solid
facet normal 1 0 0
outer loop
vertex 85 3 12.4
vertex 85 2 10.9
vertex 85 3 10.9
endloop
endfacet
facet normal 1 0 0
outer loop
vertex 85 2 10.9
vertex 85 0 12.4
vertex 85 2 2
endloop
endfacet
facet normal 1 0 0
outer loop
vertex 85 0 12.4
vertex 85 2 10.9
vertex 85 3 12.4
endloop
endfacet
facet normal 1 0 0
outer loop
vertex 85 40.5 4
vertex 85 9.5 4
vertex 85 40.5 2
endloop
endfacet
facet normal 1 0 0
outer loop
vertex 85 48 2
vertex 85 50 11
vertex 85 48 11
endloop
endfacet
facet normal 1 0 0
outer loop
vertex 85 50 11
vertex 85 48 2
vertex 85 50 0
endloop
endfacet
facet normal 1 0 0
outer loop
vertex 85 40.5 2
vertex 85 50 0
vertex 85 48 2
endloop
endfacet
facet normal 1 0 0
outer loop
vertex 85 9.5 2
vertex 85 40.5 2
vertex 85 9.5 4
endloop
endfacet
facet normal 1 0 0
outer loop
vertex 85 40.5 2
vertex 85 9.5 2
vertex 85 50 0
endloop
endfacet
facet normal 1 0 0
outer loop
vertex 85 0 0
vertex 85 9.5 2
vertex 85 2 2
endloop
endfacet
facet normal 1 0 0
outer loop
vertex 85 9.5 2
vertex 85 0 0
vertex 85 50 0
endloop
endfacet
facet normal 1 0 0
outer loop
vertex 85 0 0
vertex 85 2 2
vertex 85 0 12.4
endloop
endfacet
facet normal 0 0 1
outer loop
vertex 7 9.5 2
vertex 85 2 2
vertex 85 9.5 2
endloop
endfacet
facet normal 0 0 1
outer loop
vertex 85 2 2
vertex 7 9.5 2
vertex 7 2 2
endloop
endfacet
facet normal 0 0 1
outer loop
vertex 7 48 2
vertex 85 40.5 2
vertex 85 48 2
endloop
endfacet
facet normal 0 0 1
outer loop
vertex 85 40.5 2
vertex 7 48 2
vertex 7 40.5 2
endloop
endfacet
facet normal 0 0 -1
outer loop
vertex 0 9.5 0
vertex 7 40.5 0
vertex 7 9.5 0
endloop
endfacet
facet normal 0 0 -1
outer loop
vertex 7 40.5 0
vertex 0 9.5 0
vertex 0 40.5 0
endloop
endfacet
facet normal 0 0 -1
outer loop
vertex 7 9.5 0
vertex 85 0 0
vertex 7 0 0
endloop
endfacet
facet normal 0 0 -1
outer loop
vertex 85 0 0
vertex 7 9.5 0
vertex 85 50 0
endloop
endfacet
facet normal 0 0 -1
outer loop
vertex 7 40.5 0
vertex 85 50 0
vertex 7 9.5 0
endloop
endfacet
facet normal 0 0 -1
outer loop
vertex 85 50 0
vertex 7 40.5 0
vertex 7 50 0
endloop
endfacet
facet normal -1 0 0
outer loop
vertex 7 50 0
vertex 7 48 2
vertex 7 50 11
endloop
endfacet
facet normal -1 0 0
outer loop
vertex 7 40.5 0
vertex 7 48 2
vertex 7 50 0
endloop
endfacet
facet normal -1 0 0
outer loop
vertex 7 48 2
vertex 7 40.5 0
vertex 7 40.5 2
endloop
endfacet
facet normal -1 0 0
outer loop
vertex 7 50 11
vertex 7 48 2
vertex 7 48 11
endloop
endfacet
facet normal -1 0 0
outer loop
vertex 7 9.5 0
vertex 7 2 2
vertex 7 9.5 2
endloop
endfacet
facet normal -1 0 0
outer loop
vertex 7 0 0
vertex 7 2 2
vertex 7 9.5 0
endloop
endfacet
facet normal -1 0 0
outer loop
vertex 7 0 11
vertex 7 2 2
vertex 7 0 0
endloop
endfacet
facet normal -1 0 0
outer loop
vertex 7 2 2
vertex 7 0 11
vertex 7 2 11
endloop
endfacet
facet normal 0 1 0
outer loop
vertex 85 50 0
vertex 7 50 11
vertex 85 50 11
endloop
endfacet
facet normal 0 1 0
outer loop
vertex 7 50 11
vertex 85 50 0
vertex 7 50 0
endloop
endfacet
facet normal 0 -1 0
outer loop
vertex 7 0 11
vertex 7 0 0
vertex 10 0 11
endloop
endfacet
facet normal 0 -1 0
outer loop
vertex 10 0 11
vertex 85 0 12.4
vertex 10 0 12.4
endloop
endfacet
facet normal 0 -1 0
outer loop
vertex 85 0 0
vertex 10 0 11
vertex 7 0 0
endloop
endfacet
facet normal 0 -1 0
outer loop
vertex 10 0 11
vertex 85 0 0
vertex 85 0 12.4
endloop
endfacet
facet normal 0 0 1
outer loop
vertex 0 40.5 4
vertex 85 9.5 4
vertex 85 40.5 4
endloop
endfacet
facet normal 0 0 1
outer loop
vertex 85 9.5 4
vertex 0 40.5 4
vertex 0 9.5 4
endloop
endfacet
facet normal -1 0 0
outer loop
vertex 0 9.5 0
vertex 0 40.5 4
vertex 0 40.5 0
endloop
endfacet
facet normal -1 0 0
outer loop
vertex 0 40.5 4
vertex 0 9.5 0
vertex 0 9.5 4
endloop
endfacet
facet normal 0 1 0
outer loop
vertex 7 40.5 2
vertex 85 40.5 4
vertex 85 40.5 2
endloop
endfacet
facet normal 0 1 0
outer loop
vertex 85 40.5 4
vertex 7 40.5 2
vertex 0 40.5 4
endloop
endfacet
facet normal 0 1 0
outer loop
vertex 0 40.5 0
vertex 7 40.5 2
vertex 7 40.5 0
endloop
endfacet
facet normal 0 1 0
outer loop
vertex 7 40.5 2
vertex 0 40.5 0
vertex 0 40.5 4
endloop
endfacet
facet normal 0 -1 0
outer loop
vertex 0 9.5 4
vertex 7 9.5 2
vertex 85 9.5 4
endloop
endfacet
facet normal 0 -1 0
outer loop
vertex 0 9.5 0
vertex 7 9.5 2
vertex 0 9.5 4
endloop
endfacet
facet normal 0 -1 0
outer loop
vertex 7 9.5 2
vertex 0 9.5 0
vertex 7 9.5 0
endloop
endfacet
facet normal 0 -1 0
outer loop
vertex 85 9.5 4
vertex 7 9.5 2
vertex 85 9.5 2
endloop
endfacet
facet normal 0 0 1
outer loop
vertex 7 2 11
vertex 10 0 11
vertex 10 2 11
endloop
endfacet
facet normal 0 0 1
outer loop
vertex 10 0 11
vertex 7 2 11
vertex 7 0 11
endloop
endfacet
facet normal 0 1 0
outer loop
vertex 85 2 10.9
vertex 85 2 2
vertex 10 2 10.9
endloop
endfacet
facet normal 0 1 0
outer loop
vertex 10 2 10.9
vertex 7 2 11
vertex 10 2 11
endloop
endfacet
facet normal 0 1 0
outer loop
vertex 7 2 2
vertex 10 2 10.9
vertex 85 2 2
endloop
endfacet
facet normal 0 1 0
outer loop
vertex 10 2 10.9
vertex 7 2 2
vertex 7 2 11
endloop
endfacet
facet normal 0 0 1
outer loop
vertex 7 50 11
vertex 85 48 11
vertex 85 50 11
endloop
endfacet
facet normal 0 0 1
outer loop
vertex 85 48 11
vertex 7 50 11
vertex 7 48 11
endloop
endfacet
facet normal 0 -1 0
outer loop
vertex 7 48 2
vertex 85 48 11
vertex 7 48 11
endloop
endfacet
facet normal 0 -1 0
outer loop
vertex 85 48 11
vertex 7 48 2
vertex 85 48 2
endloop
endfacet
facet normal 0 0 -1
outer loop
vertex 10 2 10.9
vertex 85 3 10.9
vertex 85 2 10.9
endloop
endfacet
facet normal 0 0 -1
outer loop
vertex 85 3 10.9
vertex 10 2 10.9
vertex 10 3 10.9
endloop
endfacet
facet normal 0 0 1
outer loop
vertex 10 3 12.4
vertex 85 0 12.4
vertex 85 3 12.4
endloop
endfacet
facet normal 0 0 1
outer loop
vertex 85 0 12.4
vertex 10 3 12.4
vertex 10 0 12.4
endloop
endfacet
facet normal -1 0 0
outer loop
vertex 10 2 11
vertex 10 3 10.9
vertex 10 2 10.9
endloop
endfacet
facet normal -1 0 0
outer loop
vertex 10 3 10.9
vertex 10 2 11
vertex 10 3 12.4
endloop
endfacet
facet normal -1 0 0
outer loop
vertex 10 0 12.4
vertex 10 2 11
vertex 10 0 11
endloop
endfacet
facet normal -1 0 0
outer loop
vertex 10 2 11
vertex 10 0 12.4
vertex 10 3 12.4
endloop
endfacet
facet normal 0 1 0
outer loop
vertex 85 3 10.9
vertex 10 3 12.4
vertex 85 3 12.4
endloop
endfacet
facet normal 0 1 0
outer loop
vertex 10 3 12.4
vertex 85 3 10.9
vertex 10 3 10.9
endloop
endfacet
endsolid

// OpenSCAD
union() {
    translate([7, 0, 0]) cube([78, 50, 2]);
    translate([0, 9.5, 0]) cube([85, 31, 4]);
    translate([7, 0, 0]) cube([78, 2, 11]);
    translate([7, 48, 0]) cube([78, 2, 11]);
    color("Green") translate([7, 0, 10.9]) linear_extrude(height=1.5) polygon(points=[[3, 3], [3, 0], [78, 0], [78, 3]]);
}
